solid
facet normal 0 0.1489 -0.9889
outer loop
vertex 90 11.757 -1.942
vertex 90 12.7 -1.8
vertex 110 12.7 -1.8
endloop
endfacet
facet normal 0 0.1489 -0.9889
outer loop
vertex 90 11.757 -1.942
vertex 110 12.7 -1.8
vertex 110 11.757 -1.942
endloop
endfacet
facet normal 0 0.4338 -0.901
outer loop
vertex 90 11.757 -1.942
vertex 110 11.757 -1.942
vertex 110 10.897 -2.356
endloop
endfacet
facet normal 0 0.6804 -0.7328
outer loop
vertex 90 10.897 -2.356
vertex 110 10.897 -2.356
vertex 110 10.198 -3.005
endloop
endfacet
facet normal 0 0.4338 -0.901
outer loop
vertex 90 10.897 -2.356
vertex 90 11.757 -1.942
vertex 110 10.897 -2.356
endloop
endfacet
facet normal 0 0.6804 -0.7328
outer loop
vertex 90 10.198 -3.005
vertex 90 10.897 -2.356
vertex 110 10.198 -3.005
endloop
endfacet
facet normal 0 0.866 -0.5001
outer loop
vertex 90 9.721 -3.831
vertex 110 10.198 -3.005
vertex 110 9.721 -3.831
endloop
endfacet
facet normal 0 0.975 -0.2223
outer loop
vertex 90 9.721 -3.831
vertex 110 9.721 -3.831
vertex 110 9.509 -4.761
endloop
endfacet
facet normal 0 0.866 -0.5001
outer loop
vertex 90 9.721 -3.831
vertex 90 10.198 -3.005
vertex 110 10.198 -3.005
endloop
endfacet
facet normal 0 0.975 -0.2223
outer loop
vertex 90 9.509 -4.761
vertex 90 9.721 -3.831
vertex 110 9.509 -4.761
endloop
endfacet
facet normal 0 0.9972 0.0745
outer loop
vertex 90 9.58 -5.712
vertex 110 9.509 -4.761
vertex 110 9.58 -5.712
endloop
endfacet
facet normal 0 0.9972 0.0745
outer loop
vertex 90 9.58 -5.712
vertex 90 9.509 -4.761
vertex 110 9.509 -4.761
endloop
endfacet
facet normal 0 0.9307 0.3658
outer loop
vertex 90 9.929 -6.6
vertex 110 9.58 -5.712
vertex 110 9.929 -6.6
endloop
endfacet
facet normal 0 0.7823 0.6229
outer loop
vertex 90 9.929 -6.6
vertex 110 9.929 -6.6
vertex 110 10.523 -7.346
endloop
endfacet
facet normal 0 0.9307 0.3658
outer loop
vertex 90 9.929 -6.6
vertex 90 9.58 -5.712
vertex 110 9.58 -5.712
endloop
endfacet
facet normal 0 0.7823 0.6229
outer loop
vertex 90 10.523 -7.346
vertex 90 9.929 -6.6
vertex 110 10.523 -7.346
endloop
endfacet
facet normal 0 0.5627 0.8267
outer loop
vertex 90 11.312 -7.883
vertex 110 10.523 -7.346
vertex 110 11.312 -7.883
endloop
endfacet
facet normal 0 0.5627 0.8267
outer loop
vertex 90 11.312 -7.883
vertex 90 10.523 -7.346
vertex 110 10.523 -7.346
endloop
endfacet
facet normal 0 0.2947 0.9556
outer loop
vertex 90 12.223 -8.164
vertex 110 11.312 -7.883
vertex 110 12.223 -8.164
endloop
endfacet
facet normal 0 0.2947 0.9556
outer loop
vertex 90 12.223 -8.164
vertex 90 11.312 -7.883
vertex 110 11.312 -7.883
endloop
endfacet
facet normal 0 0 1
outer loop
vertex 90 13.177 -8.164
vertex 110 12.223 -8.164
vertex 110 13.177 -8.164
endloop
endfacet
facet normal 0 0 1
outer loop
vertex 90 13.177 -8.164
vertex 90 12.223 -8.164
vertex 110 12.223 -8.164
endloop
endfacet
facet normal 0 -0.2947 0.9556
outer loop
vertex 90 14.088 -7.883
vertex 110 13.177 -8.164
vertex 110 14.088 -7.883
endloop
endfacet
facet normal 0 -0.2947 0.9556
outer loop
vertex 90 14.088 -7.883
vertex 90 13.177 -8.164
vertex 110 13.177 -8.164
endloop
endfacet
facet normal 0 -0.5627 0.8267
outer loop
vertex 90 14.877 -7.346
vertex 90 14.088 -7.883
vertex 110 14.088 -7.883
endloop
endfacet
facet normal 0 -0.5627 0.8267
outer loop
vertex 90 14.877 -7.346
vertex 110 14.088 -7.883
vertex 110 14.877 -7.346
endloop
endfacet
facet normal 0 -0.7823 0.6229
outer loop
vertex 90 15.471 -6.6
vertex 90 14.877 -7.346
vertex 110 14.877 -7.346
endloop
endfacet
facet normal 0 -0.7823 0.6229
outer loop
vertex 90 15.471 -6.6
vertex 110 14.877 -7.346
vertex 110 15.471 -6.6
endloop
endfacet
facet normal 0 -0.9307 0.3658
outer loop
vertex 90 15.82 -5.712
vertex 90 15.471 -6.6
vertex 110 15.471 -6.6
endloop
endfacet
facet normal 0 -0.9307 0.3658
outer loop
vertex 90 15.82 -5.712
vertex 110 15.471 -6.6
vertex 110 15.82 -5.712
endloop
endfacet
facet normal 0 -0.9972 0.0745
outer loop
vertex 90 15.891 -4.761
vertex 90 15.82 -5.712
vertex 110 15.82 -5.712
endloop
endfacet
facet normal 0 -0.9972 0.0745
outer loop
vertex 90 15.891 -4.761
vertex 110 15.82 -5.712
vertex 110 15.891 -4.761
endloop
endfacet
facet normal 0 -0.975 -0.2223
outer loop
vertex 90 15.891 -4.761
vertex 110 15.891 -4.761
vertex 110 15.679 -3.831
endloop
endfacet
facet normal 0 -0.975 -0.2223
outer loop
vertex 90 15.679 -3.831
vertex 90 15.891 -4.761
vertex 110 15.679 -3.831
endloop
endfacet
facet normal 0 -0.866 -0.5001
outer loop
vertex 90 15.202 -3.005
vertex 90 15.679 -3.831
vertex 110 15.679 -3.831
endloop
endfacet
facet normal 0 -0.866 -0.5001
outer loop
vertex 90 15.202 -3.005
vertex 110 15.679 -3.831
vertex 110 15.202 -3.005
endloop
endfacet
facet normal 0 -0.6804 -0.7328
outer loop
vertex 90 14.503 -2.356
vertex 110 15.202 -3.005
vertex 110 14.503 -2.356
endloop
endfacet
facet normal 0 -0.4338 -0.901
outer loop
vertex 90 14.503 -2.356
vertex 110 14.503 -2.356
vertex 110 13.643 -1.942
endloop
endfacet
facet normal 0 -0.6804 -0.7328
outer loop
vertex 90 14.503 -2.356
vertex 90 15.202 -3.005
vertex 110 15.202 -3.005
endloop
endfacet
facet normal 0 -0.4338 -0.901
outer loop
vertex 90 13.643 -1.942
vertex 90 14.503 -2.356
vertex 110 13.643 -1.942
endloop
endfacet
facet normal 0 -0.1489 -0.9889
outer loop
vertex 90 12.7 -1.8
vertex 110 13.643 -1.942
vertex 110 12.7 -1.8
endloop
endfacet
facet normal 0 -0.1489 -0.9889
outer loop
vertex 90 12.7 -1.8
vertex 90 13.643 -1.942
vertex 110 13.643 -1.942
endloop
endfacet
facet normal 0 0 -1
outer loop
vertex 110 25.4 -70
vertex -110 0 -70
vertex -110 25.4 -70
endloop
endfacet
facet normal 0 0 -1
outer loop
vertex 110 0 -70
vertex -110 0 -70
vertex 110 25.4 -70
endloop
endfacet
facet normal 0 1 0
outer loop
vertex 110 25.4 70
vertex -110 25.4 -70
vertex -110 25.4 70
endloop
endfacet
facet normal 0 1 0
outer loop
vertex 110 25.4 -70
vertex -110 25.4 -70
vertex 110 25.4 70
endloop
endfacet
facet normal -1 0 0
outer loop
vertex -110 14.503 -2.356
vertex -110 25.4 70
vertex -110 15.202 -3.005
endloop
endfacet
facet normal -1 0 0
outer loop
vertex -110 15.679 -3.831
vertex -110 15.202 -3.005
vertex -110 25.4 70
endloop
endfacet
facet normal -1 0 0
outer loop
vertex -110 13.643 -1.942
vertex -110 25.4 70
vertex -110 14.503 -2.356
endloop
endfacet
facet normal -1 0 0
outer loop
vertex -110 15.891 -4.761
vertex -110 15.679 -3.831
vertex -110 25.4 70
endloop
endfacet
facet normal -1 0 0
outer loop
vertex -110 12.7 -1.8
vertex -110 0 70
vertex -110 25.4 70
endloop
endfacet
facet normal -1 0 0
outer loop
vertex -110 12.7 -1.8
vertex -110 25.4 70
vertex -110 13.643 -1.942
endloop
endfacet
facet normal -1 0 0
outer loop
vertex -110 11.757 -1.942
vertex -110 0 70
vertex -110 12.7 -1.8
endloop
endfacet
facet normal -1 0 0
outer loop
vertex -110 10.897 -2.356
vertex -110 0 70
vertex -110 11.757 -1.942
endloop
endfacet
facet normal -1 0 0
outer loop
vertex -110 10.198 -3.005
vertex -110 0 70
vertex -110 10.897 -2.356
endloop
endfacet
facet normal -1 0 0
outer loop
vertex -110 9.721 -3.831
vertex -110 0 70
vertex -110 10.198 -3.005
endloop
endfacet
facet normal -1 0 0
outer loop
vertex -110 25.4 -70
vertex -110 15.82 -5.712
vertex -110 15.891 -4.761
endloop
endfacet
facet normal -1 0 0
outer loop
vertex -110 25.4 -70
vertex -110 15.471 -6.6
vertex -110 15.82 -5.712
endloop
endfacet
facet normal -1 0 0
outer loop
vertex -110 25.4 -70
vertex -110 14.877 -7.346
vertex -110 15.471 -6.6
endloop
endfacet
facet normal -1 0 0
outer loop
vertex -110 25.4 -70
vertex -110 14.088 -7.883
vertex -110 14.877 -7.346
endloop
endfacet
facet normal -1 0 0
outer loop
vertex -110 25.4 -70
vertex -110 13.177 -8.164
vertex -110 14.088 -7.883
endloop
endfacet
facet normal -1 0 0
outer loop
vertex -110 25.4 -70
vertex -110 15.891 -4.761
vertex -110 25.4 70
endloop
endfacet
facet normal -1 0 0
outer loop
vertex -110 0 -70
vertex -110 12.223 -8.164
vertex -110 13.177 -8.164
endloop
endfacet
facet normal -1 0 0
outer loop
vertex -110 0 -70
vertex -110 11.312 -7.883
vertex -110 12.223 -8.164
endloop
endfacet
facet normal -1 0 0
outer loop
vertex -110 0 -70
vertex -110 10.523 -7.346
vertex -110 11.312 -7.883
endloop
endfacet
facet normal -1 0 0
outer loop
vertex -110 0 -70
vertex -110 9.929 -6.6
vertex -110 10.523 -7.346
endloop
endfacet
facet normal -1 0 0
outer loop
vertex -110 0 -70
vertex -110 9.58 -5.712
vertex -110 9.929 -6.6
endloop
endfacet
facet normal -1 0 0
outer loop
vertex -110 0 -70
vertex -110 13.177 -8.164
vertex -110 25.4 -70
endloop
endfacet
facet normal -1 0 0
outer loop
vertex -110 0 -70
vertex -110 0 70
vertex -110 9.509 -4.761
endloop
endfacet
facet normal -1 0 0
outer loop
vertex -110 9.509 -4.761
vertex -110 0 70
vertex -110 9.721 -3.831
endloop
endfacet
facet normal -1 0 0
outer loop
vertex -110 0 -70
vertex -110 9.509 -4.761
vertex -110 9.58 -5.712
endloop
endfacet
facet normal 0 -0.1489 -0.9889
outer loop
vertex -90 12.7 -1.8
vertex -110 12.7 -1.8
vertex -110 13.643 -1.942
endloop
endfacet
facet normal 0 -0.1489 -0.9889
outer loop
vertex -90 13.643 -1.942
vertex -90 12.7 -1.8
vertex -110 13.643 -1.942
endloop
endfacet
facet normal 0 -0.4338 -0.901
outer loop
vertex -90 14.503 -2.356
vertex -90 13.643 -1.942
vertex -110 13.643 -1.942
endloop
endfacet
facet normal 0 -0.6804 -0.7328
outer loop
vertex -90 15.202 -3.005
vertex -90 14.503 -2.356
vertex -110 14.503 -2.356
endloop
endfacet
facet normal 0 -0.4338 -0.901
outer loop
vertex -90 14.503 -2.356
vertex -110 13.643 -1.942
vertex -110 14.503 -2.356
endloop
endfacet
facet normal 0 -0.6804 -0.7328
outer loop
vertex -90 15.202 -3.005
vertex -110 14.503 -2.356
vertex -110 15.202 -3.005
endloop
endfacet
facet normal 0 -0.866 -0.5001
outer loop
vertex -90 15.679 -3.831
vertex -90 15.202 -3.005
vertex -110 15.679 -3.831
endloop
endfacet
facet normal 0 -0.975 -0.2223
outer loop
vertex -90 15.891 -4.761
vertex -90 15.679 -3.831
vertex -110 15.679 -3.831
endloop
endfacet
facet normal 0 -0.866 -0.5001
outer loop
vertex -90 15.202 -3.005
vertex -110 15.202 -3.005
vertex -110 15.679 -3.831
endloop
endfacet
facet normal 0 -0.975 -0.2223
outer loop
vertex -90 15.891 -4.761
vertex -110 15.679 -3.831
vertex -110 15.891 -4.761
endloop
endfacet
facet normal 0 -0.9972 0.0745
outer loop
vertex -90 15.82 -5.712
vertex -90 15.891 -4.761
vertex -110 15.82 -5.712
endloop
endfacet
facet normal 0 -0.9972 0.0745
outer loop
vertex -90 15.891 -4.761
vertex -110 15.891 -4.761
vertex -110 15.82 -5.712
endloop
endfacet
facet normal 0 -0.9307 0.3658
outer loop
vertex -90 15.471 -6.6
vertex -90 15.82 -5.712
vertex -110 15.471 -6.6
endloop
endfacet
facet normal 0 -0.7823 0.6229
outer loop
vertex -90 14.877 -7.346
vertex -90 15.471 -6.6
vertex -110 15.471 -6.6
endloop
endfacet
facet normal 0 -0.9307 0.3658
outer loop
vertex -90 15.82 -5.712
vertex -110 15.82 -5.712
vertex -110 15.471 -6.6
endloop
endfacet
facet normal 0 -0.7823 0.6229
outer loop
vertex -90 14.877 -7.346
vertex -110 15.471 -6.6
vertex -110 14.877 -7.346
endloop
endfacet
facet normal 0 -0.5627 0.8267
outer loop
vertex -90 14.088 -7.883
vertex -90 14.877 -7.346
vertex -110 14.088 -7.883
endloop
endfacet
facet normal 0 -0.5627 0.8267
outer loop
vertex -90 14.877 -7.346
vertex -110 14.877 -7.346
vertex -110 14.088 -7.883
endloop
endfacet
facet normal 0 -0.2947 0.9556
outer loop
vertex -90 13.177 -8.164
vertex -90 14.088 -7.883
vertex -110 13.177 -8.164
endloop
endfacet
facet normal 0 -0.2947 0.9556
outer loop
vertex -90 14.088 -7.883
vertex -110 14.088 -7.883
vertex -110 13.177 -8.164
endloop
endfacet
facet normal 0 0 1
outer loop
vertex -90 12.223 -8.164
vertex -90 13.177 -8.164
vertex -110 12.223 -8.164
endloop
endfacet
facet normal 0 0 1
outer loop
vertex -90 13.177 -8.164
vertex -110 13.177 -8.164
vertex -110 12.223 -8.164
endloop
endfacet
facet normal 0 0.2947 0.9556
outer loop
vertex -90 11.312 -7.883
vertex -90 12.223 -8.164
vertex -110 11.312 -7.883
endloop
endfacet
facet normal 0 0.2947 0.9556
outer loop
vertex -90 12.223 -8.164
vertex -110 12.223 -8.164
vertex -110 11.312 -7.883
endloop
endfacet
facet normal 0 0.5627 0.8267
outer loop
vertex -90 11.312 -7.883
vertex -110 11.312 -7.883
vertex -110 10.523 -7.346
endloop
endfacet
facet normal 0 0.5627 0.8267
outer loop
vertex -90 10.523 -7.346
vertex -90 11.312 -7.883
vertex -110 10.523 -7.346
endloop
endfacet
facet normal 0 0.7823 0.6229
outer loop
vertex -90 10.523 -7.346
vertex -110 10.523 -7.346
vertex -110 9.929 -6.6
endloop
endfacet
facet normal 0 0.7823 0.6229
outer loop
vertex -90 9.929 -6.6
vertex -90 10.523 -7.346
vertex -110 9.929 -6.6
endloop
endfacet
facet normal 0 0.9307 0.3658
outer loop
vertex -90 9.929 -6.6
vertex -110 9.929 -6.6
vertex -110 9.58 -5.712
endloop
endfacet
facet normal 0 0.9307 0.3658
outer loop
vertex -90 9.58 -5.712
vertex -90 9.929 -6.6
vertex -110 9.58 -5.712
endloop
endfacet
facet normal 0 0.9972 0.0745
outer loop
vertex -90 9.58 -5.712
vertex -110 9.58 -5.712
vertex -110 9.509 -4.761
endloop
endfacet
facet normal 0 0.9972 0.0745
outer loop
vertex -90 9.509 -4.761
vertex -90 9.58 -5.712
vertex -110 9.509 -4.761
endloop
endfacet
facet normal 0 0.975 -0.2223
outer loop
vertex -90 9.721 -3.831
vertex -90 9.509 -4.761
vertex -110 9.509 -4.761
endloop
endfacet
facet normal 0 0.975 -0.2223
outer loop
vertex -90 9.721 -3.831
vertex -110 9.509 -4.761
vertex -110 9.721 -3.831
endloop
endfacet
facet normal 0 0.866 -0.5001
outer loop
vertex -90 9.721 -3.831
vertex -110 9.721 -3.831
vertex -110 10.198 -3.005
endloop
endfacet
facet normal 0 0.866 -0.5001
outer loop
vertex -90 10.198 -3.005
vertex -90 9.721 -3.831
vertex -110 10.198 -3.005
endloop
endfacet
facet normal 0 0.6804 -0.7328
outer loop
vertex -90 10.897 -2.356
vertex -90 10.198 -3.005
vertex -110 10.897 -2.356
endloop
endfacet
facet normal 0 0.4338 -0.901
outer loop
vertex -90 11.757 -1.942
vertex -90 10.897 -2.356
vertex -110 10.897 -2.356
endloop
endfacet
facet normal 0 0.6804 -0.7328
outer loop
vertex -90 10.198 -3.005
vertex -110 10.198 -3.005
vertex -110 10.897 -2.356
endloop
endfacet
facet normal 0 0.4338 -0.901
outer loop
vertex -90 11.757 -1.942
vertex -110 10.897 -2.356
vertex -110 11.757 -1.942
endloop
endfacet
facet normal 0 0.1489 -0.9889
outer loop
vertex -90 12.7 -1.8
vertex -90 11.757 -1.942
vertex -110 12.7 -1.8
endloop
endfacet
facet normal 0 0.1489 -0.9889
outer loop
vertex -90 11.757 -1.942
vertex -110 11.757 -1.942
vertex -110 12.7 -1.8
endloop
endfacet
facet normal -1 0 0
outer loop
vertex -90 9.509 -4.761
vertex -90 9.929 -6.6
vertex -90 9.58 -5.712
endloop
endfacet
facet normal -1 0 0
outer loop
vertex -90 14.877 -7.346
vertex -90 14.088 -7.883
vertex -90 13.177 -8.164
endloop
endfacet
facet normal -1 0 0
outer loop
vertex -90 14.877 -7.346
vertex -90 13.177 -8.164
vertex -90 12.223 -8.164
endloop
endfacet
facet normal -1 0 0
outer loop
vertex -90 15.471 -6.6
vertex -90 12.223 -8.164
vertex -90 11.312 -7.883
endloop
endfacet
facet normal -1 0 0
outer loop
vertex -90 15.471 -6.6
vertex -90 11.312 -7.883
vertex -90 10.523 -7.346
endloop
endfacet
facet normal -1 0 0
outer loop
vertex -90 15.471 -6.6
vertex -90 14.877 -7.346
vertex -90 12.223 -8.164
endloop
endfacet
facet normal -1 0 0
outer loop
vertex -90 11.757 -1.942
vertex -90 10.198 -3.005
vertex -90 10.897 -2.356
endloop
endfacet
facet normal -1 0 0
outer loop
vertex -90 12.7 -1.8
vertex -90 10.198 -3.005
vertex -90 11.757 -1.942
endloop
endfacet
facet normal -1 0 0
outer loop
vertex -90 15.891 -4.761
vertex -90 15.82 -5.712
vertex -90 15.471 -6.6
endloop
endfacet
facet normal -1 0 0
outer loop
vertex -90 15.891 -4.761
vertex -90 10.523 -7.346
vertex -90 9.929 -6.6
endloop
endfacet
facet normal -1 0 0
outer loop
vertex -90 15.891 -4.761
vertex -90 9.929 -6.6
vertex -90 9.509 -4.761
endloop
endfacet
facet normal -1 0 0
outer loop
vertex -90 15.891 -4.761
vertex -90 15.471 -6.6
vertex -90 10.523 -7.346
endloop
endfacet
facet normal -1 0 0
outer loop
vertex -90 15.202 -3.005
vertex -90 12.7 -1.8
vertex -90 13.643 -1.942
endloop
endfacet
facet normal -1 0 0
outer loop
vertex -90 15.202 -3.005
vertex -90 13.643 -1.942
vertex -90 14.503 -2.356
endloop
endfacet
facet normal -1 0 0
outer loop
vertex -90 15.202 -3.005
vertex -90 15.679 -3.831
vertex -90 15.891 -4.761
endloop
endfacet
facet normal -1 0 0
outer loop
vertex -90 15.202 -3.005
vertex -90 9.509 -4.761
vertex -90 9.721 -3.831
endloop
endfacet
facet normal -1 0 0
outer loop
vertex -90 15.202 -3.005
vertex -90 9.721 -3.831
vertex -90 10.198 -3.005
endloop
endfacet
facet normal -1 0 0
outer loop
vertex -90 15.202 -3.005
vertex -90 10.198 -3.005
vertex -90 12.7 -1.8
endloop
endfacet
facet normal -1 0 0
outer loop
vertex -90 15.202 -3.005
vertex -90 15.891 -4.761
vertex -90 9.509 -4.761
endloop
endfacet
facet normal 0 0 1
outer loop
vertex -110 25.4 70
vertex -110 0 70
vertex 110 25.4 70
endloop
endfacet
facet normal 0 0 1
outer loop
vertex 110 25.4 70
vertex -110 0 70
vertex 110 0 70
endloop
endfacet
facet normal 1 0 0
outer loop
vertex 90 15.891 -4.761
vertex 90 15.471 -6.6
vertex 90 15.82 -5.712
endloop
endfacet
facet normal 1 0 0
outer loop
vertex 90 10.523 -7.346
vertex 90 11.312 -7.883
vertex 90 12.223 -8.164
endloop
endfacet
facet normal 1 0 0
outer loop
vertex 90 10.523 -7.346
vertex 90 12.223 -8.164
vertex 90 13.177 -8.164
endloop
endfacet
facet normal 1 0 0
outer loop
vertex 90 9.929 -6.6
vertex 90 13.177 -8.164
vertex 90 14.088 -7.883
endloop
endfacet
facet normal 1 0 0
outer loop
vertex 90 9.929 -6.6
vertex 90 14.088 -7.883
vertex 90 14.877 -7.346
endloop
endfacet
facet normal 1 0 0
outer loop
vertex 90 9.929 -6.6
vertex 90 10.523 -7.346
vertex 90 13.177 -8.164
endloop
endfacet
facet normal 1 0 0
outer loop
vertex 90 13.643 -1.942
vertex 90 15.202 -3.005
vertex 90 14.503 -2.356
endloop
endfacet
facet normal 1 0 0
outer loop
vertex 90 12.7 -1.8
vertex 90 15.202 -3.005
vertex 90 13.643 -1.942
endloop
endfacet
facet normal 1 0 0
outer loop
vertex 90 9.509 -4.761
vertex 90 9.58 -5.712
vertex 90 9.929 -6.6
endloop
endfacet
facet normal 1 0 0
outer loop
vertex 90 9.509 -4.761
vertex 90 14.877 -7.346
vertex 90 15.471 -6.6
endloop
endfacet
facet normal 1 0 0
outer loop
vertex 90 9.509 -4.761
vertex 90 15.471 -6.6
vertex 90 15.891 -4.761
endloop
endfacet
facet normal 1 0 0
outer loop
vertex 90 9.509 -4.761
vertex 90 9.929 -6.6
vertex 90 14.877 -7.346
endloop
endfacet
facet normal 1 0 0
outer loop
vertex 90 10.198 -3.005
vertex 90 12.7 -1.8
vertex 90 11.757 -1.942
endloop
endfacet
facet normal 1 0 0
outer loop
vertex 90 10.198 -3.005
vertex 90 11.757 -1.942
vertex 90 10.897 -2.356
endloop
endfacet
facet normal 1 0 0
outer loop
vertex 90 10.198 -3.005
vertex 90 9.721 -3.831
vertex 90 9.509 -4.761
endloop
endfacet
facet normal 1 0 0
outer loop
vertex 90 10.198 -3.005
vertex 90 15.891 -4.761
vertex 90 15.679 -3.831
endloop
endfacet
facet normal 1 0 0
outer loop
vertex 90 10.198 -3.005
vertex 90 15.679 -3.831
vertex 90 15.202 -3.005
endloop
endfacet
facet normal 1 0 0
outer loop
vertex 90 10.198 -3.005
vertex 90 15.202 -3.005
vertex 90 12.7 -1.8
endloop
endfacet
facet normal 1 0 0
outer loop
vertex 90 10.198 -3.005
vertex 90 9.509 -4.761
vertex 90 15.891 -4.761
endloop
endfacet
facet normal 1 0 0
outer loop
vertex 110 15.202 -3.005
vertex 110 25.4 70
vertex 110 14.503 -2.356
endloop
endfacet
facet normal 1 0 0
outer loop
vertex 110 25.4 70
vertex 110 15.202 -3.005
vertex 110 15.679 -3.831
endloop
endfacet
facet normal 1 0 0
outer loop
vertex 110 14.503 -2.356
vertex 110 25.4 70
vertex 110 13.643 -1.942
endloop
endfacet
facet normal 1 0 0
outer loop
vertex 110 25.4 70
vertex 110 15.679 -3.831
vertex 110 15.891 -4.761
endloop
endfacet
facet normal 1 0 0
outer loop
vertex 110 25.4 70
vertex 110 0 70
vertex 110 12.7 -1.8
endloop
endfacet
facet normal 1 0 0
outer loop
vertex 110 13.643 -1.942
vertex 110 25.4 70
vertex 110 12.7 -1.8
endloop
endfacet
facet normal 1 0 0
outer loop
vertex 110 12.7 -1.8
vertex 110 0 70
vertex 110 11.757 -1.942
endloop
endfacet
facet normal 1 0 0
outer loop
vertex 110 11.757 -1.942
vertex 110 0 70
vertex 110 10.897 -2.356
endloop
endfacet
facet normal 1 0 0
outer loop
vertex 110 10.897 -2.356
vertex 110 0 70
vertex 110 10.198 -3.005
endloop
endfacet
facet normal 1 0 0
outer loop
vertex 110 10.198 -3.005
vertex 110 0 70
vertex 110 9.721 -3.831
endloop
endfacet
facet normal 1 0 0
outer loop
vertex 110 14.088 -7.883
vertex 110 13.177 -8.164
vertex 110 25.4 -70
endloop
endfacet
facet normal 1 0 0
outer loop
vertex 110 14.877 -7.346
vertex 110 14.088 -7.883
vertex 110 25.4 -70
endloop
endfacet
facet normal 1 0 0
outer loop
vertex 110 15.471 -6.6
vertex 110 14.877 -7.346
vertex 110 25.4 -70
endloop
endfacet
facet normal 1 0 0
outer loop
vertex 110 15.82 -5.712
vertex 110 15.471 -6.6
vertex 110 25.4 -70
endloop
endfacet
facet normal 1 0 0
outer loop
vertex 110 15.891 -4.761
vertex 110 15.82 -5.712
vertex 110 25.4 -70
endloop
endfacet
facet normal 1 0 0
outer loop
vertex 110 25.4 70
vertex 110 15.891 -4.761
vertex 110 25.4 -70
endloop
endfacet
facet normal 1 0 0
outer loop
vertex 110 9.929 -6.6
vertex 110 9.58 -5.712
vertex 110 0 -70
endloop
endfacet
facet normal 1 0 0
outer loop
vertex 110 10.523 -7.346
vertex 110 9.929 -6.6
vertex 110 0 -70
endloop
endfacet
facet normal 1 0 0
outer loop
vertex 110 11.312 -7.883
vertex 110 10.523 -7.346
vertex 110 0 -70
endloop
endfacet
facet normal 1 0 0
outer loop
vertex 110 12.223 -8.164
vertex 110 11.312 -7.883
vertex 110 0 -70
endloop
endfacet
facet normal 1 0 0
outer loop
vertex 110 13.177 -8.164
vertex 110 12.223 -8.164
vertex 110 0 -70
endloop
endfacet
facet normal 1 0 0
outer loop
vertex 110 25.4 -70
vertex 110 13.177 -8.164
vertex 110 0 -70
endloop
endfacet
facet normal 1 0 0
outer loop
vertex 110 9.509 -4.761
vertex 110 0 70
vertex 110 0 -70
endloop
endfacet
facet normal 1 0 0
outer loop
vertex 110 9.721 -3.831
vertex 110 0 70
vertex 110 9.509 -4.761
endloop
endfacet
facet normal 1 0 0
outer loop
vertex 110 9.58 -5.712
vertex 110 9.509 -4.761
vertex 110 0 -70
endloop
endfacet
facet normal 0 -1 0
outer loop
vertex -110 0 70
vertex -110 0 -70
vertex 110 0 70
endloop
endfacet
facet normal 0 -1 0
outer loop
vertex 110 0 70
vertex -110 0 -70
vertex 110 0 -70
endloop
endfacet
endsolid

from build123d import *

# Parameters (mm, degrees)
SKETCH1_W           = 220
SKETCH1_H           = 140
BOSS_EXTRUDE1_DEPTH = 25.4
SKETCH3_R           = 3.2
CUT_EXTRUDE1_DEPTH  = 20
CUT_EXTRUDE2_START  = -20
SKETCH2_R           = 3.2
CUT_EXTRUDE2_DEPTH  = 20


with BuildPart() as part:
    # Sketch1 → Boss-Extrude1 (new body)
    with BuildSketch(Plane(origin=(0, 0, 0), x_dir=(1, 0, 0), z_dir=(0, 1, 0))):
        Rectangle(SKETCH1_W, SKETCH1_H)
    extrude(amount=BOSS_EXTRUDE1_DEPTH)

    # Sketch3 → Cut-Extrude1 (cut)
    with BuildSketch(Plane.ZY.offset(110)):
        with Locations((-5, 12.7)):
            Circle(SKETCH3_R)
    extrude(amount=-CUT_EXTRUDE1_DEPTH, mode=Mode.SUBTRACT)

    # Sketch2 → Cut-Extrude2 (cut)
    with BuildSketch(Plane(origin=(110, 0, 0), x_dir=(0, 0, -1), z_dir=(1, 0, 0)).offset(CUT_EXTRUDE2_START)):
        with Locations(Location((5, 12.7, 0), (0, 0, 180))):
            Circle(SKETCH2_R)
    extrude(amount=CUT_EXTRUDE2_DEPTH, mode=Mode.SUBTRACT)


solid = part.part
